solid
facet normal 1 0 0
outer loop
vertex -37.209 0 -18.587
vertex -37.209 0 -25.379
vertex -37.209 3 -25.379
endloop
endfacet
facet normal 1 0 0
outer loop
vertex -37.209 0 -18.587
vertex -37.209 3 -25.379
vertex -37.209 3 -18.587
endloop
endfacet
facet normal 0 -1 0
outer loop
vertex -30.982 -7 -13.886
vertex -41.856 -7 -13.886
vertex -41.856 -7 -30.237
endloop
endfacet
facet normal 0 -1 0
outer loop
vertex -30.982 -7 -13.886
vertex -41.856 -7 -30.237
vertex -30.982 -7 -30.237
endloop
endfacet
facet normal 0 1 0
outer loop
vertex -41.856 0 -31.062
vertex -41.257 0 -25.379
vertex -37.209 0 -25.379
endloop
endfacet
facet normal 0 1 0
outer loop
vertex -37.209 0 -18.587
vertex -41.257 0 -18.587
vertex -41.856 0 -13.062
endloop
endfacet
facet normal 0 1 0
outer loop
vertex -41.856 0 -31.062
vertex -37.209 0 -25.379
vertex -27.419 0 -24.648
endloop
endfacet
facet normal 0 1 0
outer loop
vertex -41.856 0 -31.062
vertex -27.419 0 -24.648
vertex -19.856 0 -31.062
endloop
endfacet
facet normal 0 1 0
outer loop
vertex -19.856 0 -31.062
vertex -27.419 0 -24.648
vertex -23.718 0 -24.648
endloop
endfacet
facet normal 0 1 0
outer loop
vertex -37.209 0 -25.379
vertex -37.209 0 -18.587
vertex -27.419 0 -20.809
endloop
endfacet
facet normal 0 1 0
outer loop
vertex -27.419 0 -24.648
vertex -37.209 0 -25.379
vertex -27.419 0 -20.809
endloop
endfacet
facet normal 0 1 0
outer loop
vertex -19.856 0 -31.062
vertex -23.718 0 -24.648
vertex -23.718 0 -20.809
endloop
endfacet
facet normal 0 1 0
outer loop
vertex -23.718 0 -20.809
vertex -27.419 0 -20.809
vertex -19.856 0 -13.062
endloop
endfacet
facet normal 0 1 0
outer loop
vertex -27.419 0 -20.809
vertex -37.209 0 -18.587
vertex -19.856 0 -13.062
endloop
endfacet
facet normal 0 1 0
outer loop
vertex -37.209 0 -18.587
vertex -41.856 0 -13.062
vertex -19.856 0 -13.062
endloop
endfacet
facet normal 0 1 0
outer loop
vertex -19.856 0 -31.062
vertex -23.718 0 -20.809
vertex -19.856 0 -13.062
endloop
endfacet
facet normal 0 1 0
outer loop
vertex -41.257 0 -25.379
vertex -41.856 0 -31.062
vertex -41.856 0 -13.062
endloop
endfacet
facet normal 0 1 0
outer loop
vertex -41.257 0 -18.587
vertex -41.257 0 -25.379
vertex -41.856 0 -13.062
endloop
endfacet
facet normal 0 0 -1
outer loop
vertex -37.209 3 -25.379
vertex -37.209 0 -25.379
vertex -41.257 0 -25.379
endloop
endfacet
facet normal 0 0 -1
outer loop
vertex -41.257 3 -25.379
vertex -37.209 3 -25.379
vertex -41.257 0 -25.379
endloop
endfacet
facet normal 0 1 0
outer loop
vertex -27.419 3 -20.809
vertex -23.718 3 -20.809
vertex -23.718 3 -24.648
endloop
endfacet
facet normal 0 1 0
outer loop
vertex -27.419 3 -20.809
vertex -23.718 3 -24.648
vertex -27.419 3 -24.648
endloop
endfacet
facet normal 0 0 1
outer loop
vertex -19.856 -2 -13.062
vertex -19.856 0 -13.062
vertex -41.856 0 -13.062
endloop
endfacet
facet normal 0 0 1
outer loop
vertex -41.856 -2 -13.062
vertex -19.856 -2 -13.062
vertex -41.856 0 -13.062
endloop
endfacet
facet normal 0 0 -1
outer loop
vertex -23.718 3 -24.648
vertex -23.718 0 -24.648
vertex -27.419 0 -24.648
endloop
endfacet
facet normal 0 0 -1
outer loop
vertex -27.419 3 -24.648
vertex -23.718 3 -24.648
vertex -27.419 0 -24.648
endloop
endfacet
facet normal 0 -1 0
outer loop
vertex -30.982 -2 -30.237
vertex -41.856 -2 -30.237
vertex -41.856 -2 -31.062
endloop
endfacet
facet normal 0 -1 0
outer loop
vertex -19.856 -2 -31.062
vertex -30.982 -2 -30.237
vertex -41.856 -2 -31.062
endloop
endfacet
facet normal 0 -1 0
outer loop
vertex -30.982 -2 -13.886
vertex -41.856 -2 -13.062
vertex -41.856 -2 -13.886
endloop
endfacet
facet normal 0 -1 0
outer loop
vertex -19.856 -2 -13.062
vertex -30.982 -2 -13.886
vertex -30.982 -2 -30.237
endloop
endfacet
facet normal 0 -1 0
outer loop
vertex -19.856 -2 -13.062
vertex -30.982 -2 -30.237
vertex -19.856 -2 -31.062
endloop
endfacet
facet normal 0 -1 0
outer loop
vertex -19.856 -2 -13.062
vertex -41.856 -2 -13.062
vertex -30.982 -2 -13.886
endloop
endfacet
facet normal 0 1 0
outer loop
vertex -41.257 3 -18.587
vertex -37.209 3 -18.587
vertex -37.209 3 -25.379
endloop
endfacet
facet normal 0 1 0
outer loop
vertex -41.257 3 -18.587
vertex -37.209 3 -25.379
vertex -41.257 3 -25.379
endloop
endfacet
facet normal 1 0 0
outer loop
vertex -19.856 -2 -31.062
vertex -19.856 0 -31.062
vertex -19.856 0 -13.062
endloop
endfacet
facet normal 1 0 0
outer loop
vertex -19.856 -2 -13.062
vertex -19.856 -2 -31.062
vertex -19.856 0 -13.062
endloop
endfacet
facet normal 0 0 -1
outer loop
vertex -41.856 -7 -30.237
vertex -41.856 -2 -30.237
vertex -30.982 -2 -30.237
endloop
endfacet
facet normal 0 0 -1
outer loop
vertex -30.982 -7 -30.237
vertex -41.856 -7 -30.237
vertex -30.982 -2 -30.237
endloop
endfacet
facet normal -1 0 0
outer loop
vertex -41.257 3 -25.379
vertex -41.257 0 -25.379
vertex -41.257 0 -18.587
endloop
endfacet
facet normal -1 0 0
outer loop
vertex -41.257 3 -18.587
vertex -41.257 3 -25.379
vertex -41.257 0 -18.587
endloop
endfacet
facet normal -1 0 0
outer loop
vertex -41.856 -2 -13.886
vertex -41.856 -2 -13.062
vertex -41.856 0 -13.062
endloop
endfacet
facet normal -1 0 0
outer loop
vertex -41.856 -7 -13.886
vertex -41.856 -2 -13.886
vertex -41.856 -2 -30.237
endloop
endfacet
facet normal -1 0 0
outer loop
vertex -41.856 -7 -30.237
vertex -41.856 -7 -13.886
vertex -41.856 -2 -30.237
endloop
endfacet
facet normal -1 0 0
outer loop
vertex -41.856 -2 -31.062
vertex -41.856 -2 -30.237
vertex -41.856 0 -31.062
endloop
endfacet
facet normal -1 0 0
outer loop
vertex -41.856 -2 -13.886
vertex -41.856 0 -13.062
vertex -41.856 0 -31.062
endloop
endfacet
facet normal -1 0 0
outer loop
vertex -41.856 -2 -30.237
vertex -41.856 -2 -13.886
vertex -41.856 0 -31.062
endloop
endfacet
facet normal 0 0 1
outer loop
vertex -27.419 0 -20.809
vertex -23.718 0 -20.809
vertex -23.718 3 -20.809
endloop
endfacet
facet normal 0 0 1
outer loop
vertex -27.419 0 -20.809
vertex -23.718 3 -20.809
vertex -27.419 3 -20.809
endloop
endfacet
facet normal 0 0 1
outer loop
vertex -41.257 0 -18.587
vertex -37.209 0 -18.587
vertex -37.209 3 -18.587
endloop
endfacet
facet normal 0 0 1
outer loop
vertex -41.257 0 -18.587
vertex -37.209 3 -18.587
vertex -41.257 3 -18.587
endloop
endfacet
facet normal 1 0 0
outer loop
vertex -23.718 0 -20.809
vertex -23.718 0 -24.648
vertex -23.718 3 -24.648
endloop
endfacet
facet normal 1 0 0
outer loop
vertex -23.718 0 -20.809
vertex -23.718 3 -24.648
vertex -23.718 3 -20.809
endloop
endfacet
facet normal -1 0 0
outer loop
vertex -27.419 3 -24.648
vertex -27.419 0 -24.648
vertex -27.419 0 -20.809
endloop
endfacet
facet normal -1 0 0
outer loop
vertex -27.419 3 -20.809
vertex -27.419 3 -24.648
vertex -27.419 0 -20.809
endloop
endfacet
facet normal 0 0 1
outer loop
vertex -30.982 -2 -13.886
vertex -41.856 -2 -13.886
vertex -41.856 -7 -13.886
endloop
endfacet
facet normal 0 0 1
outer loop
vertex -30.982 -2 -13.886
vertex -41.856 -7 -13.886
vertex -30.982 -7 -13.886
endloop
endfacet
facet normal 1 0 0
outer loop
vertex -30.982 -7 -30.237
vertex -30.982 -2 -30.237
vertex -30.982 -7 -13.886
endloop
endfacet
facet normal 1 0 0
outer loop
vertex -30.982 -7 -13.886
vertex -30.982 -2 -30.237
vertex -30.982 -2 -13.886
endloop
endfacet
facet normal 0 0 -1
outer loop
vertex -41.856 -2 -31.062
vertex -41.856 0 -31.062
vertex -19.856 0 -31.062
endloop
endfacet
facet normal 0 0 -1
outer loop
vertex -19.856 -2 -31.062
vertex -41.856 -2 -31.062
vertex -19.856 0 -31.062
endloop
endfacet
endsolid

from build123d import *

# Parameters (mm, degrees)
F0_W     = 10.874254629
F0_H     = 16.3510471284
F1_DEPTH = 2
F2_DEPTH = 7
F3_W     = 4.0485225618
F3_H     = 6.7925304174
F3_W_2   = 3.7012062967
F3_H_2   = 3.8396660239
F4_DEPTH = 3


with BuildPart() as f1:
    # F0 (on Front) → F1 (new body)
    with BuildSketch(Plane.XZ):
        Polygon((-19.8561436236, -13.0616642237), (-41.8561436236, -13.0616642237), (-41.8561436236, -13.8861406595), (-30.9818889946, -13.8861406595), (-30.9818889946, -30.2371877879), (-41.8561436236, -30.2371877879), (-41.8561436236, -31.0616642237), (-19.8561436236, -31.0616642237), align=None)
        with Locations((-36.4190163091, -22.0616642237)):
            Rectangle(F0_W, F0_H)
    extrude(amount=F1_DEPTH)

    # F0 (on Front) → F2 (join)
    with BuildSketch(Plane.XZ):
        with Locations((-36.4190163091, -22.0616642237)):
            Rectangle(F0_W, F0_H)
    extrude(amount=F2_DEPTH)

    # F3 (on face) → F4 (join)
    with BuildSketch(Plane(origin=(0, 0, 0), x_dir=(-1, 0, 0), z_dir=(0, 1, 0))):
        with Locations((39.2332170159, -21.982813254)):
            Rectangle(F3_W, F3_H)
        with Locations((25.5681611598, -22.7285558358)):
            Rectangle(F3_W_2, F3_H_2)
    extrude(amount=F4_DEPTH)


solid = f1.part
